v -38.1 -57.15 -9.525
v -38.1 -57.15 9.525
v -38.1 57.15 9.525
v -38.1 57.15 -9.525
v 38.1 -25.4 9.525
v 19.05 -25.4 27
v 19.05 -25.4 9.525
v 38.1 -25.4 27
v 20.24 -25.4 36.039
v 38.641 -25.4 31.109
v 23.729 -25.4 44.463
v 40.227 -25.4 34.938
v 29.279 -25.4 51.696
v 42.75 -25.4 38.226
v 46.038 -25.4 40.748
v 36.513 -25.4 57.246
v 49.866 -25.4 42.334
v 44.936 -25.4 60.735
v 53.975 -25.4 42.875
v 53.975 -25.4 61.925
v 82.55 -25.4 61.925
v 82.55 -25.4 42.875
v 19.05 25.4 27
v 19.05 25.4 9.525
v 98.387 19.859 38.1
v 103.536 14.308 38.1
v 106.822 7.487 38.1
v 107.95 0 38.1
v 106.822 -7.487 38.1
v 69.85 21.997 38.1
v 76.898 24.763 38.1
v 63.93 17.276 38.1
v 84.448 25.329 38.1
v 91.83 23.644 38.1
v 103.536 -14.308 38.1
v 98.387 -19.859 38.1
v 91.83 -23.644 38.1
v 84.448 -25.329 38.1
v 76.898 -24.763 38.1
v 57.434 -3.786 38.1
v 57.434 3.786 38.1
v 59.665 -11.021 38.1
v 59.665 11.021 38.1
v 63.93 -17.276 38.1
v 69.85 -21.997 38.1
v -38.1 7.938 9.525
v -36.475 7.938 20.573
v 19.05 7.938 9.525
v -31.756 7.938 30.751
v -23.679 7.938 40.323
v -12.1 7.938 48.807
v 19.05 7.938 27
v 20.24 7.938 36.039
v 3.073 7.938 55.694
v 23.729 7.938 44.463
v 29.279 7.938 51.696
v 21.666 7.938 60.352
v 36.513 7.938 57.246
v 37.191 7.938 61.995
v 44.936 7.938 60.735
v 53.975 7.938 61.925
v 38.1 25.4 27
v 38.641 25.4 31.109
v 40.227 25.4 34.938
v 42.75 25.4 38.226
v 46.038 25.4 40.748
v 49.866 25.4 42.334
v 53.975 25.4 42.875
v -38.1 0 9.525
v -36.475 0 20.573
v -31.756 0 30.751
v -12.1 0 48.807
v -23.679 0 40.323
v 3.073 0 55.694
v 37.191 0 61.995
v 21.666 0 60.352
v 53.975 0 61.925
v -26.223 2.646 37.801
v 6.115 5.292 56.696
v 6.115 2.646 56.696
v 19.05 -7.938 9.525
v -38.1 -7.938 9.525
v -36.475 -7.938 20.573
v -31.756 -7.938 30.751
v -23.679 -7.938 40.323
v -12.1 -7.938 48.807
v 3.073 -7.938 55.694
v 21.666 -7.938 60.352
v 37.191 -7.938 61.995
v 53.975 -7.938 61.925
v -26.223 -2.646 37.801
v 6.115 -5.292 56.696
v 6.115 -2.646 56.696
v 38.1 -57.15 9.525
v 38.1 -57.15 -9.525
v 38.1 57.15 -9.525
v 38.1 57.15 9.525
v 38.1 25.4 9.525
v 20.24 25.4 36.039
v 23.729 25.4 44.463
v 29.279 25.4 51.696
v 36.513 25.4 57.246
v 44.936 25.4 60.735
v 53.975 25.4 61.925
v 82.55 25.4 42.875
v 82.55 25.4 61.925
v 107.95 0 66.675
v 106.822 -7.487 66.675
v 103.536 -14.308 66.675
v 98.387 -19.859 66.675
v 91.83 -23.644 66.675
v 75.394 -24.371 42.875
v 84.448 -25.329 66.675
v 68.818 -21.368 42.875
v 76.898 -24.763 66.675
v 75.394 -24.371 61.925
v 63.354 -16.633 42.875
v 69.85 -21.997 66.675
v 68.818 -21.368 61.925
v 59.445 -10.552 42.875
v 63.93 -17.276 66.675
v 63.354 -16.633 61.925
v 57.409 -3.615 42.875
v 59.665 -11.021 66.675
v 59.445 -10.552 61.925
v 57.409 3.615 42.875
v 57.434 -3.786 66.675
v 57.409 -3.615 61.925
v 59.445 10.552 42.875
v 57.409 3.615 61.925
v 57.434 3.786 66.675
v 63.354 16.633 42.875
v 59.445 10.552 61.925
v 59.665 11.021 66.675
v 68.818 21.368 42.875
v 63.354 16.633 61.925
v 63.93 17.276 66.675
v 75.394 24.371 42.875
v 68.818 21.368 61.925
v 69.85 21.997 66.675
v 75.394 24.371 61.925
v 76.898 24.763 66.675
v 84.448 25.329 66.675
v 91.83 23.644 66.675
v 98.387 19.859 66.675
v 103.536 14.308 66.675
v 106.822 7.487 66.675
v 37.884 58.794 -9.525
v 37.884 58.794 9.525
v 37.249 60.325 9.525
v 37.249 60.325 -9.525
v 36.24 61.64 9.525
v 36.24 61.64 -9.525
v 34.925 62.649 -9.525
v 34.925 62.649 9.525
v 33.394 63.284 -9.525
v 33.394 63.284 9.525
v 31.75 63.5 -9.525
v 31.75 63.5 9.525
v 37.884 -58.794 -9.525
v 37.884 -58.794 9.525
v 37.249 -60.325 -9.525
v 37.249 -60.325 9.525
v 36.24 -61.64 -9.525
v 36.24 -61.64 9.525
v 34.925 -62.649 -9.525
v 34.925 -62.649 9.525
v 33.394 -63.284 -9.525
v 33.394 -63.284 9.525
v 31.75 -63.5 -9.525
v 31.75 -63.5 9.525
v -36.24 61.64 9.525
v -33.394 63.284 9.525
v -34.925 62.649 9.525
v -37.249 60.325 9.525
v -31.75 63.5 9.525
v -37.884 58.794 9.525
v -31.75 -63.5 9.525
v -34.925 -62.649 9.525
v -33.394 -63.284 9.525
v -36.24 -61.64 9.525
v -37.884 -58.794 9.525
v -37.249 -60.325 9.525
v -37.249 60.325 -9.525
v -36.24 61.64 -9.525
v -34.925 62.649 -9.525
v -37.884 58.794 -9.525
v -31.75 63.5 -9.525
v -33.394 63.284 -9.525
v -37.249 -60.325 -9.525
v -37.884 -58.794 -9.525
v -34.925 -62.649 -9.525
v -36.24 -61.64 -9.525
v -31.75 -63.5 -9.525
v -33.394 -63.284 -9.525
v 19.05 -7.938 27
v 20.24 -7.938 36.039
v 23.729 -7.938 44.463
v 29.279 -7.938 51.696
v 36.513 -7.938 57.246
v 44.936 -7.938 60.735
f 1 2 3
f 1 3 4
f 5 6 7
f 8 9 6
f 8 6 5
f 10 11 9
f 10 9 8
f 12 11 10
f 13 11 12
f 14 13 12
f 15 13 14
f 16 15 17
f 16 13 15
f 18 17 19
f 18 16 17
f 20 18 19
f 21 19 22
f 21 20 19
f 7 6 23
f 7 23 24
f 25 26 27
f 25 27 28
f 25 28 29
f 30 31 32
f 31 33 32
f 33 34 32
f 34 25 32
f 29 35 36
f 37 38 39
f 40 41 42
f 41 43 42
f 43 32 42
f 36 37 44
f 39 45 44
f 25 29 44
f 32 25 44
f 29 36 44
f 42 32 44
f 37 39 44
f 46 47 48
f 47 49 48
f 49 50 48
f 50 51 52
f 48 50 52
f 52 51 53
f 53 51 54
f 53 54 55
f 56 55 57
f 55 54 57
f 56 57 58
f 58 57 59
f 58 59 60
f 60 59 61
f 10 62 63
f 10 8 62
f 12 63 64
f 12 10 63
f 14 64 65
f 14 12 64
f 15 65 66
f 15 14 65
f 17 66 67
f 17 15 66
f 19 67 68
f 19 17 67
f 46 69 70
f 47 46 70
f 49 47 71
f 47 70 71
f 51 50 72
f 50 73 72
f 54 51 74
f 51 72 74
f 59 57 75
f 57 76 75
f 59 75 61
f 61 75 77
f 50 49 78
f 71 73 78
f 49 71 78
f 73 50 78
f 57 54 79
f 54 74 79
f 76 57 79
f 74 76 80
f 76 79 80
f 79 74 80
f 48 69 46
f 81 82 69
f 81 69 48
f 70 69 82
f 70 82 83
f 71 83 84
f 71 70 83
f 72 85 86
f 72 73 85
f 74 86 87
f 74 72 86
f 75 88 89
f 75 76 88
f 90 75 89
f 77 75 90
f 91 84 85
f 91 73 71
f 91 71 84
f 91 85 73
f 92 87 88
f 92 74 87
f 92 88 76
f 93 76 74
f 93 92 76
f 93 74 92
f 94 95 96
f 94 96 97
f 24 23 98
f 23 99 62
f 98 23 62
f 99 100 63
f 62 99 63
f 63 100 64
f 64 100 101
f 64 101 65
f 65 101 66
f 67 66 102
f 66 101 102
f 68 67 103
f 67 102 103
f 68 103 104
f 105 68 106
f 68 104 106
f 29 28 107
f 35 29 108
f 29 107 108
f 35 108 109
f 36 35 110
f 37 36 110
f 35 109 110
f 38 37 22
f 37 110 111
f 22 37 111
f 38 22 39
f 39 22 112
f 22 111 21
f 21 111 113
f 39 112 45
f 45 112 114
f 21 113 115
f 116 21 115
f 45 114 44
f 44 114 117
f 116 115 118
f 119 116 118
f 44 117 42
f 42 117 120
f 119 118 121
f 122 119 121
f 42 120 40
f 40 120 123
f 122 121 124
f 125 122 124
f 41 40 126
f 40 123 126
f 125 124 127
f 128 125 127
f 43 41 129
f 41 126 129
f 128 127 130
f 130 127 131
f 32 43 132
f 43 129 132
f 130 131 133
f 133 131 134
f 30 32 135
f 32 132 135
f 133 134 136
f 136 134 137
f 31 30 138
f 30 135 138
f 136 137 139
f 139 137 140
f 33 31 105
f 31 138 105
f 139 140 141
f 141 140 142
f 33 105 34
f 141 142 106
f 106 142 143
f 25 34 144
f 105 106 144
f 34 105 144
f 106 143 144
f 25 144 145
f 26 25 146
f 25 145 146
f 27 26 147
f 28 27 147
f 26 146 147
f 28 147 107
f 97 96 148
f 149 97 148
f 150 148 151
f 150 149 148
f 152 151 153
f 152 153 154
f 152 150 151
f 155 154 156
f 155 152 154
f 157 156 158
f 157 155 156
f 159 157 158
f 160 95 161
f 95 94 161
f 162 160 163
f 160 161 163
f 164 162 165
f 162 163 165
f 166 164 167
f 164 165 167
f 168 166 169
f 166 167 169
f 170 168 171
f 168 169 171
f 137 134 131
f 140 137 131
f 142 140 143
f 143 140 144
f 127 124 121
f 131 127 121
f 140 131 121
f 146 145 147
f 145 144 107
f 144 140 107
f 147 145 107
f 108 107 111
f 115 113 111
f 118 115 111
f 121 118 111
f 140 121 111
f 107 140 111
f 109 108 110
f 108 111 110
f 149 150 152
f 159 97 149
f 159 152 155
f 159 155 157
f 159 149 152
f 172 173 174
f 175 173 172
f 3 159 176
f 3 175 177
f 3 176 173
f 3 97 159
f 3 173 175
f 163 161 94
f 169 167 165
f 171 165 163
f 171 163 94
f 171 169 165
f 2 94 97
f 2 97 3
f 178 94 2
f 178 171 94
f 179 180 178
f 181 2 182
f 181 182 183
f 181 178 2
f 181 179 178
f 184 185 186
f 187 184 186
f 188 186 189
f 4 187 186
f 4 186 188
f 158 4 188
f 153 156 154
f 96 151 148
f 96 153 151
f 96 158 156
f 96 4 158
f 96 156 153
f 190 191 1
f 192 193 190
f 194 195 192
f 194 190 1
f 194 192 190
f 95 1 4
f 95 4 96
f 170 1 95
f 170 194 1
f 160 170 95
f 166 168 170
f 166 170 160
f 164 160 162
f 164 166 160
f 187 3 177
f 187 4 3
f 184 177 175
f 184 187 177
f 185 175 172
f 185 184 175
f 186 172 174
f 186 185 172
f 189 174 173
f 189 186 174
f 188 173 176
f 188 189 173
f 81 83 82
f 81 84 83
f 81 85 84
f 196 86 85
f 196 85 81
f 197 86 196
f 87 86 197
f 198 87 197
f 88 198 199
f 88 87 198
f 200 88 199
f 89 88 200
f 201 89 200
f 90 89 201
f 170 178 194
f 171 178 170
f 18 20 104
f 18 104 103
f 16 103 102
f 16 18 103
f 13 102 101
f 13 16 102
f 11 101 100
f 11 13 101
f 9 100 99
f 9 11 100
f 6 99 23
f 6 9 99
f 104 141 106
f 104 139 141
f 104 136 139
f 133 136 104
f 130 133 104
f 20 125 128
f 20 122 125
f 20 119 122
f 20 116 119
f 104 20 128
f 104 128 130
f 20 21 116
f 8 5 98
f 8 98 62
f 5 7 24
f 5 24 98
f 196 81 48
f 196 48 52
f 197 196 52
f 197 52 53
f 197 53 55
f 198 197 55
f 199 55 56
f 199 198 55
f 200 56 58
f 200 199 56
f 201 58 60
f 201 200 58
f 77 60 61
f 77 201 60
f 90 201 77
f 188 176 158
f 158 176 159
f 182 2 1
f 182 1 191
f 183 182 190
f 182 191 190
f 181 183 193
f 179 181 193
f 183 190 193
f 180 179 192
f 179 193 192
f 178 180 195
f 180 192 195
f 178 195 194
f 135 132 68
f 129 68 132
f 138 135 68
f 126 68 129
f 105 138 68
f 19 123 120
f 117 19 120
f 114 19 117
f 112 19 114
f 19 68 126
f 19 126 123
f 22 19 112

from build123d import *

# Parameters (mm, degrees)
F1_DEPTH = 63.5
F2_DEPTH = 7.9375
F0_W     = 25.4
F0_H     = 19.0499997646
F3_DEPTH = 25.4
F5_R     = 6.35


with BuildPart() as f1:
    # F0 (on Front) → F1 (new body, symmetric)
    with BuildSketch(Plane.XZ):
        Polygon((38.1, -9.525), (38.1, 9.525), (19.0500002354, 9.525), (-38.1, 9.525), (-38.1, -9.525), align=None)
    extrude(amount=F1_DEPTH, both=True)

    # F5
    f5_edges = [f1.edges().sort_by_distance(p)[0] for p in [
        (38.1, -63.5, 0),
        (-38.1, -63.5, 0),
        (38.1, 63.5, 0),
        (-38.1, 63.5, 0),
    ]]
    fillet(f5_edges, radius=F5_R)


with BuildPart() as f2:
    # F0 (on Front) → F2 (new body, symmetric)
    with BuildSketch(Plane.XZ):
        with BuildLine():
            Line((-38.1, 9.525), (19.0500002354, 9.525))
            Line((19.0500002354, 9.525), (19.0500002354, 27.0002))
            ThreePointArc((19.0500002354, 27.0002), (29.2792958335, 51.6959041665), (53.975, 61.9251997646))
            add(Edge.make_bspline(
                [(-38.1, 9.525), (-38.1, 41.0639718175), (0, 64.9557411671), (53.975, 61.9251997646)],
                knots=[0, 0, 0, 0, 105.941429858, 105.941429858, 105.941429858, 105.941429858], degree=3))
        make_face()
    extrude(amount=F2_DEPTH, both=True)


with BuildPart() as f3:
    # F0 (on Front) → F3 (new body, symmetric)
    with BuildSketch(Plane.XZ):
        with Locations((69.85, 52.4001998823)):
            Rectangle(F0_W, F0_H)
        with BuildLine():
            Line((19.0500002354, 9.525), (38.1, 9.525))
            Line((38.1, 9.525), (38.1, 27.0002))
            ThreePointArc((38.1, 27.0002), (42.7496798487, 38.2255201513), (53.975, 42.8752))
            Line((53.975, 42.8752), (57.15, 42.8752))
            Line((57.15, 42.8752), (57.15, 61.9251997646))
            Line((57.15, 61.9251997646), (53.975, 61.9251997646))
            ThreePointArc((53.975, 61.9251997646), (29.2792958335, 51.6959041665), (19.0500002354, 27.0002))
            Line((19.0500002354, 27.0002), (19.0500002354, 9.525))
        make_face()
    extrude(amount=F3_DEPTH, both=True)

    # F0 (on Front) → F4 (revolve)
    with BuildSketch(Plane.XZ):
        Polygon((82.55, 61.9251997646), (82.55, 42.8752), (82.55, 38.1), (107.95, 38.1), (107.95, 66.675), (82.55, 66.675), align=None)
    revolve(axis=Axis((82.55, 0, 52.3875), (0, 0, -1)))


solid = Compound([f1.part, f2.part, f3.part])
